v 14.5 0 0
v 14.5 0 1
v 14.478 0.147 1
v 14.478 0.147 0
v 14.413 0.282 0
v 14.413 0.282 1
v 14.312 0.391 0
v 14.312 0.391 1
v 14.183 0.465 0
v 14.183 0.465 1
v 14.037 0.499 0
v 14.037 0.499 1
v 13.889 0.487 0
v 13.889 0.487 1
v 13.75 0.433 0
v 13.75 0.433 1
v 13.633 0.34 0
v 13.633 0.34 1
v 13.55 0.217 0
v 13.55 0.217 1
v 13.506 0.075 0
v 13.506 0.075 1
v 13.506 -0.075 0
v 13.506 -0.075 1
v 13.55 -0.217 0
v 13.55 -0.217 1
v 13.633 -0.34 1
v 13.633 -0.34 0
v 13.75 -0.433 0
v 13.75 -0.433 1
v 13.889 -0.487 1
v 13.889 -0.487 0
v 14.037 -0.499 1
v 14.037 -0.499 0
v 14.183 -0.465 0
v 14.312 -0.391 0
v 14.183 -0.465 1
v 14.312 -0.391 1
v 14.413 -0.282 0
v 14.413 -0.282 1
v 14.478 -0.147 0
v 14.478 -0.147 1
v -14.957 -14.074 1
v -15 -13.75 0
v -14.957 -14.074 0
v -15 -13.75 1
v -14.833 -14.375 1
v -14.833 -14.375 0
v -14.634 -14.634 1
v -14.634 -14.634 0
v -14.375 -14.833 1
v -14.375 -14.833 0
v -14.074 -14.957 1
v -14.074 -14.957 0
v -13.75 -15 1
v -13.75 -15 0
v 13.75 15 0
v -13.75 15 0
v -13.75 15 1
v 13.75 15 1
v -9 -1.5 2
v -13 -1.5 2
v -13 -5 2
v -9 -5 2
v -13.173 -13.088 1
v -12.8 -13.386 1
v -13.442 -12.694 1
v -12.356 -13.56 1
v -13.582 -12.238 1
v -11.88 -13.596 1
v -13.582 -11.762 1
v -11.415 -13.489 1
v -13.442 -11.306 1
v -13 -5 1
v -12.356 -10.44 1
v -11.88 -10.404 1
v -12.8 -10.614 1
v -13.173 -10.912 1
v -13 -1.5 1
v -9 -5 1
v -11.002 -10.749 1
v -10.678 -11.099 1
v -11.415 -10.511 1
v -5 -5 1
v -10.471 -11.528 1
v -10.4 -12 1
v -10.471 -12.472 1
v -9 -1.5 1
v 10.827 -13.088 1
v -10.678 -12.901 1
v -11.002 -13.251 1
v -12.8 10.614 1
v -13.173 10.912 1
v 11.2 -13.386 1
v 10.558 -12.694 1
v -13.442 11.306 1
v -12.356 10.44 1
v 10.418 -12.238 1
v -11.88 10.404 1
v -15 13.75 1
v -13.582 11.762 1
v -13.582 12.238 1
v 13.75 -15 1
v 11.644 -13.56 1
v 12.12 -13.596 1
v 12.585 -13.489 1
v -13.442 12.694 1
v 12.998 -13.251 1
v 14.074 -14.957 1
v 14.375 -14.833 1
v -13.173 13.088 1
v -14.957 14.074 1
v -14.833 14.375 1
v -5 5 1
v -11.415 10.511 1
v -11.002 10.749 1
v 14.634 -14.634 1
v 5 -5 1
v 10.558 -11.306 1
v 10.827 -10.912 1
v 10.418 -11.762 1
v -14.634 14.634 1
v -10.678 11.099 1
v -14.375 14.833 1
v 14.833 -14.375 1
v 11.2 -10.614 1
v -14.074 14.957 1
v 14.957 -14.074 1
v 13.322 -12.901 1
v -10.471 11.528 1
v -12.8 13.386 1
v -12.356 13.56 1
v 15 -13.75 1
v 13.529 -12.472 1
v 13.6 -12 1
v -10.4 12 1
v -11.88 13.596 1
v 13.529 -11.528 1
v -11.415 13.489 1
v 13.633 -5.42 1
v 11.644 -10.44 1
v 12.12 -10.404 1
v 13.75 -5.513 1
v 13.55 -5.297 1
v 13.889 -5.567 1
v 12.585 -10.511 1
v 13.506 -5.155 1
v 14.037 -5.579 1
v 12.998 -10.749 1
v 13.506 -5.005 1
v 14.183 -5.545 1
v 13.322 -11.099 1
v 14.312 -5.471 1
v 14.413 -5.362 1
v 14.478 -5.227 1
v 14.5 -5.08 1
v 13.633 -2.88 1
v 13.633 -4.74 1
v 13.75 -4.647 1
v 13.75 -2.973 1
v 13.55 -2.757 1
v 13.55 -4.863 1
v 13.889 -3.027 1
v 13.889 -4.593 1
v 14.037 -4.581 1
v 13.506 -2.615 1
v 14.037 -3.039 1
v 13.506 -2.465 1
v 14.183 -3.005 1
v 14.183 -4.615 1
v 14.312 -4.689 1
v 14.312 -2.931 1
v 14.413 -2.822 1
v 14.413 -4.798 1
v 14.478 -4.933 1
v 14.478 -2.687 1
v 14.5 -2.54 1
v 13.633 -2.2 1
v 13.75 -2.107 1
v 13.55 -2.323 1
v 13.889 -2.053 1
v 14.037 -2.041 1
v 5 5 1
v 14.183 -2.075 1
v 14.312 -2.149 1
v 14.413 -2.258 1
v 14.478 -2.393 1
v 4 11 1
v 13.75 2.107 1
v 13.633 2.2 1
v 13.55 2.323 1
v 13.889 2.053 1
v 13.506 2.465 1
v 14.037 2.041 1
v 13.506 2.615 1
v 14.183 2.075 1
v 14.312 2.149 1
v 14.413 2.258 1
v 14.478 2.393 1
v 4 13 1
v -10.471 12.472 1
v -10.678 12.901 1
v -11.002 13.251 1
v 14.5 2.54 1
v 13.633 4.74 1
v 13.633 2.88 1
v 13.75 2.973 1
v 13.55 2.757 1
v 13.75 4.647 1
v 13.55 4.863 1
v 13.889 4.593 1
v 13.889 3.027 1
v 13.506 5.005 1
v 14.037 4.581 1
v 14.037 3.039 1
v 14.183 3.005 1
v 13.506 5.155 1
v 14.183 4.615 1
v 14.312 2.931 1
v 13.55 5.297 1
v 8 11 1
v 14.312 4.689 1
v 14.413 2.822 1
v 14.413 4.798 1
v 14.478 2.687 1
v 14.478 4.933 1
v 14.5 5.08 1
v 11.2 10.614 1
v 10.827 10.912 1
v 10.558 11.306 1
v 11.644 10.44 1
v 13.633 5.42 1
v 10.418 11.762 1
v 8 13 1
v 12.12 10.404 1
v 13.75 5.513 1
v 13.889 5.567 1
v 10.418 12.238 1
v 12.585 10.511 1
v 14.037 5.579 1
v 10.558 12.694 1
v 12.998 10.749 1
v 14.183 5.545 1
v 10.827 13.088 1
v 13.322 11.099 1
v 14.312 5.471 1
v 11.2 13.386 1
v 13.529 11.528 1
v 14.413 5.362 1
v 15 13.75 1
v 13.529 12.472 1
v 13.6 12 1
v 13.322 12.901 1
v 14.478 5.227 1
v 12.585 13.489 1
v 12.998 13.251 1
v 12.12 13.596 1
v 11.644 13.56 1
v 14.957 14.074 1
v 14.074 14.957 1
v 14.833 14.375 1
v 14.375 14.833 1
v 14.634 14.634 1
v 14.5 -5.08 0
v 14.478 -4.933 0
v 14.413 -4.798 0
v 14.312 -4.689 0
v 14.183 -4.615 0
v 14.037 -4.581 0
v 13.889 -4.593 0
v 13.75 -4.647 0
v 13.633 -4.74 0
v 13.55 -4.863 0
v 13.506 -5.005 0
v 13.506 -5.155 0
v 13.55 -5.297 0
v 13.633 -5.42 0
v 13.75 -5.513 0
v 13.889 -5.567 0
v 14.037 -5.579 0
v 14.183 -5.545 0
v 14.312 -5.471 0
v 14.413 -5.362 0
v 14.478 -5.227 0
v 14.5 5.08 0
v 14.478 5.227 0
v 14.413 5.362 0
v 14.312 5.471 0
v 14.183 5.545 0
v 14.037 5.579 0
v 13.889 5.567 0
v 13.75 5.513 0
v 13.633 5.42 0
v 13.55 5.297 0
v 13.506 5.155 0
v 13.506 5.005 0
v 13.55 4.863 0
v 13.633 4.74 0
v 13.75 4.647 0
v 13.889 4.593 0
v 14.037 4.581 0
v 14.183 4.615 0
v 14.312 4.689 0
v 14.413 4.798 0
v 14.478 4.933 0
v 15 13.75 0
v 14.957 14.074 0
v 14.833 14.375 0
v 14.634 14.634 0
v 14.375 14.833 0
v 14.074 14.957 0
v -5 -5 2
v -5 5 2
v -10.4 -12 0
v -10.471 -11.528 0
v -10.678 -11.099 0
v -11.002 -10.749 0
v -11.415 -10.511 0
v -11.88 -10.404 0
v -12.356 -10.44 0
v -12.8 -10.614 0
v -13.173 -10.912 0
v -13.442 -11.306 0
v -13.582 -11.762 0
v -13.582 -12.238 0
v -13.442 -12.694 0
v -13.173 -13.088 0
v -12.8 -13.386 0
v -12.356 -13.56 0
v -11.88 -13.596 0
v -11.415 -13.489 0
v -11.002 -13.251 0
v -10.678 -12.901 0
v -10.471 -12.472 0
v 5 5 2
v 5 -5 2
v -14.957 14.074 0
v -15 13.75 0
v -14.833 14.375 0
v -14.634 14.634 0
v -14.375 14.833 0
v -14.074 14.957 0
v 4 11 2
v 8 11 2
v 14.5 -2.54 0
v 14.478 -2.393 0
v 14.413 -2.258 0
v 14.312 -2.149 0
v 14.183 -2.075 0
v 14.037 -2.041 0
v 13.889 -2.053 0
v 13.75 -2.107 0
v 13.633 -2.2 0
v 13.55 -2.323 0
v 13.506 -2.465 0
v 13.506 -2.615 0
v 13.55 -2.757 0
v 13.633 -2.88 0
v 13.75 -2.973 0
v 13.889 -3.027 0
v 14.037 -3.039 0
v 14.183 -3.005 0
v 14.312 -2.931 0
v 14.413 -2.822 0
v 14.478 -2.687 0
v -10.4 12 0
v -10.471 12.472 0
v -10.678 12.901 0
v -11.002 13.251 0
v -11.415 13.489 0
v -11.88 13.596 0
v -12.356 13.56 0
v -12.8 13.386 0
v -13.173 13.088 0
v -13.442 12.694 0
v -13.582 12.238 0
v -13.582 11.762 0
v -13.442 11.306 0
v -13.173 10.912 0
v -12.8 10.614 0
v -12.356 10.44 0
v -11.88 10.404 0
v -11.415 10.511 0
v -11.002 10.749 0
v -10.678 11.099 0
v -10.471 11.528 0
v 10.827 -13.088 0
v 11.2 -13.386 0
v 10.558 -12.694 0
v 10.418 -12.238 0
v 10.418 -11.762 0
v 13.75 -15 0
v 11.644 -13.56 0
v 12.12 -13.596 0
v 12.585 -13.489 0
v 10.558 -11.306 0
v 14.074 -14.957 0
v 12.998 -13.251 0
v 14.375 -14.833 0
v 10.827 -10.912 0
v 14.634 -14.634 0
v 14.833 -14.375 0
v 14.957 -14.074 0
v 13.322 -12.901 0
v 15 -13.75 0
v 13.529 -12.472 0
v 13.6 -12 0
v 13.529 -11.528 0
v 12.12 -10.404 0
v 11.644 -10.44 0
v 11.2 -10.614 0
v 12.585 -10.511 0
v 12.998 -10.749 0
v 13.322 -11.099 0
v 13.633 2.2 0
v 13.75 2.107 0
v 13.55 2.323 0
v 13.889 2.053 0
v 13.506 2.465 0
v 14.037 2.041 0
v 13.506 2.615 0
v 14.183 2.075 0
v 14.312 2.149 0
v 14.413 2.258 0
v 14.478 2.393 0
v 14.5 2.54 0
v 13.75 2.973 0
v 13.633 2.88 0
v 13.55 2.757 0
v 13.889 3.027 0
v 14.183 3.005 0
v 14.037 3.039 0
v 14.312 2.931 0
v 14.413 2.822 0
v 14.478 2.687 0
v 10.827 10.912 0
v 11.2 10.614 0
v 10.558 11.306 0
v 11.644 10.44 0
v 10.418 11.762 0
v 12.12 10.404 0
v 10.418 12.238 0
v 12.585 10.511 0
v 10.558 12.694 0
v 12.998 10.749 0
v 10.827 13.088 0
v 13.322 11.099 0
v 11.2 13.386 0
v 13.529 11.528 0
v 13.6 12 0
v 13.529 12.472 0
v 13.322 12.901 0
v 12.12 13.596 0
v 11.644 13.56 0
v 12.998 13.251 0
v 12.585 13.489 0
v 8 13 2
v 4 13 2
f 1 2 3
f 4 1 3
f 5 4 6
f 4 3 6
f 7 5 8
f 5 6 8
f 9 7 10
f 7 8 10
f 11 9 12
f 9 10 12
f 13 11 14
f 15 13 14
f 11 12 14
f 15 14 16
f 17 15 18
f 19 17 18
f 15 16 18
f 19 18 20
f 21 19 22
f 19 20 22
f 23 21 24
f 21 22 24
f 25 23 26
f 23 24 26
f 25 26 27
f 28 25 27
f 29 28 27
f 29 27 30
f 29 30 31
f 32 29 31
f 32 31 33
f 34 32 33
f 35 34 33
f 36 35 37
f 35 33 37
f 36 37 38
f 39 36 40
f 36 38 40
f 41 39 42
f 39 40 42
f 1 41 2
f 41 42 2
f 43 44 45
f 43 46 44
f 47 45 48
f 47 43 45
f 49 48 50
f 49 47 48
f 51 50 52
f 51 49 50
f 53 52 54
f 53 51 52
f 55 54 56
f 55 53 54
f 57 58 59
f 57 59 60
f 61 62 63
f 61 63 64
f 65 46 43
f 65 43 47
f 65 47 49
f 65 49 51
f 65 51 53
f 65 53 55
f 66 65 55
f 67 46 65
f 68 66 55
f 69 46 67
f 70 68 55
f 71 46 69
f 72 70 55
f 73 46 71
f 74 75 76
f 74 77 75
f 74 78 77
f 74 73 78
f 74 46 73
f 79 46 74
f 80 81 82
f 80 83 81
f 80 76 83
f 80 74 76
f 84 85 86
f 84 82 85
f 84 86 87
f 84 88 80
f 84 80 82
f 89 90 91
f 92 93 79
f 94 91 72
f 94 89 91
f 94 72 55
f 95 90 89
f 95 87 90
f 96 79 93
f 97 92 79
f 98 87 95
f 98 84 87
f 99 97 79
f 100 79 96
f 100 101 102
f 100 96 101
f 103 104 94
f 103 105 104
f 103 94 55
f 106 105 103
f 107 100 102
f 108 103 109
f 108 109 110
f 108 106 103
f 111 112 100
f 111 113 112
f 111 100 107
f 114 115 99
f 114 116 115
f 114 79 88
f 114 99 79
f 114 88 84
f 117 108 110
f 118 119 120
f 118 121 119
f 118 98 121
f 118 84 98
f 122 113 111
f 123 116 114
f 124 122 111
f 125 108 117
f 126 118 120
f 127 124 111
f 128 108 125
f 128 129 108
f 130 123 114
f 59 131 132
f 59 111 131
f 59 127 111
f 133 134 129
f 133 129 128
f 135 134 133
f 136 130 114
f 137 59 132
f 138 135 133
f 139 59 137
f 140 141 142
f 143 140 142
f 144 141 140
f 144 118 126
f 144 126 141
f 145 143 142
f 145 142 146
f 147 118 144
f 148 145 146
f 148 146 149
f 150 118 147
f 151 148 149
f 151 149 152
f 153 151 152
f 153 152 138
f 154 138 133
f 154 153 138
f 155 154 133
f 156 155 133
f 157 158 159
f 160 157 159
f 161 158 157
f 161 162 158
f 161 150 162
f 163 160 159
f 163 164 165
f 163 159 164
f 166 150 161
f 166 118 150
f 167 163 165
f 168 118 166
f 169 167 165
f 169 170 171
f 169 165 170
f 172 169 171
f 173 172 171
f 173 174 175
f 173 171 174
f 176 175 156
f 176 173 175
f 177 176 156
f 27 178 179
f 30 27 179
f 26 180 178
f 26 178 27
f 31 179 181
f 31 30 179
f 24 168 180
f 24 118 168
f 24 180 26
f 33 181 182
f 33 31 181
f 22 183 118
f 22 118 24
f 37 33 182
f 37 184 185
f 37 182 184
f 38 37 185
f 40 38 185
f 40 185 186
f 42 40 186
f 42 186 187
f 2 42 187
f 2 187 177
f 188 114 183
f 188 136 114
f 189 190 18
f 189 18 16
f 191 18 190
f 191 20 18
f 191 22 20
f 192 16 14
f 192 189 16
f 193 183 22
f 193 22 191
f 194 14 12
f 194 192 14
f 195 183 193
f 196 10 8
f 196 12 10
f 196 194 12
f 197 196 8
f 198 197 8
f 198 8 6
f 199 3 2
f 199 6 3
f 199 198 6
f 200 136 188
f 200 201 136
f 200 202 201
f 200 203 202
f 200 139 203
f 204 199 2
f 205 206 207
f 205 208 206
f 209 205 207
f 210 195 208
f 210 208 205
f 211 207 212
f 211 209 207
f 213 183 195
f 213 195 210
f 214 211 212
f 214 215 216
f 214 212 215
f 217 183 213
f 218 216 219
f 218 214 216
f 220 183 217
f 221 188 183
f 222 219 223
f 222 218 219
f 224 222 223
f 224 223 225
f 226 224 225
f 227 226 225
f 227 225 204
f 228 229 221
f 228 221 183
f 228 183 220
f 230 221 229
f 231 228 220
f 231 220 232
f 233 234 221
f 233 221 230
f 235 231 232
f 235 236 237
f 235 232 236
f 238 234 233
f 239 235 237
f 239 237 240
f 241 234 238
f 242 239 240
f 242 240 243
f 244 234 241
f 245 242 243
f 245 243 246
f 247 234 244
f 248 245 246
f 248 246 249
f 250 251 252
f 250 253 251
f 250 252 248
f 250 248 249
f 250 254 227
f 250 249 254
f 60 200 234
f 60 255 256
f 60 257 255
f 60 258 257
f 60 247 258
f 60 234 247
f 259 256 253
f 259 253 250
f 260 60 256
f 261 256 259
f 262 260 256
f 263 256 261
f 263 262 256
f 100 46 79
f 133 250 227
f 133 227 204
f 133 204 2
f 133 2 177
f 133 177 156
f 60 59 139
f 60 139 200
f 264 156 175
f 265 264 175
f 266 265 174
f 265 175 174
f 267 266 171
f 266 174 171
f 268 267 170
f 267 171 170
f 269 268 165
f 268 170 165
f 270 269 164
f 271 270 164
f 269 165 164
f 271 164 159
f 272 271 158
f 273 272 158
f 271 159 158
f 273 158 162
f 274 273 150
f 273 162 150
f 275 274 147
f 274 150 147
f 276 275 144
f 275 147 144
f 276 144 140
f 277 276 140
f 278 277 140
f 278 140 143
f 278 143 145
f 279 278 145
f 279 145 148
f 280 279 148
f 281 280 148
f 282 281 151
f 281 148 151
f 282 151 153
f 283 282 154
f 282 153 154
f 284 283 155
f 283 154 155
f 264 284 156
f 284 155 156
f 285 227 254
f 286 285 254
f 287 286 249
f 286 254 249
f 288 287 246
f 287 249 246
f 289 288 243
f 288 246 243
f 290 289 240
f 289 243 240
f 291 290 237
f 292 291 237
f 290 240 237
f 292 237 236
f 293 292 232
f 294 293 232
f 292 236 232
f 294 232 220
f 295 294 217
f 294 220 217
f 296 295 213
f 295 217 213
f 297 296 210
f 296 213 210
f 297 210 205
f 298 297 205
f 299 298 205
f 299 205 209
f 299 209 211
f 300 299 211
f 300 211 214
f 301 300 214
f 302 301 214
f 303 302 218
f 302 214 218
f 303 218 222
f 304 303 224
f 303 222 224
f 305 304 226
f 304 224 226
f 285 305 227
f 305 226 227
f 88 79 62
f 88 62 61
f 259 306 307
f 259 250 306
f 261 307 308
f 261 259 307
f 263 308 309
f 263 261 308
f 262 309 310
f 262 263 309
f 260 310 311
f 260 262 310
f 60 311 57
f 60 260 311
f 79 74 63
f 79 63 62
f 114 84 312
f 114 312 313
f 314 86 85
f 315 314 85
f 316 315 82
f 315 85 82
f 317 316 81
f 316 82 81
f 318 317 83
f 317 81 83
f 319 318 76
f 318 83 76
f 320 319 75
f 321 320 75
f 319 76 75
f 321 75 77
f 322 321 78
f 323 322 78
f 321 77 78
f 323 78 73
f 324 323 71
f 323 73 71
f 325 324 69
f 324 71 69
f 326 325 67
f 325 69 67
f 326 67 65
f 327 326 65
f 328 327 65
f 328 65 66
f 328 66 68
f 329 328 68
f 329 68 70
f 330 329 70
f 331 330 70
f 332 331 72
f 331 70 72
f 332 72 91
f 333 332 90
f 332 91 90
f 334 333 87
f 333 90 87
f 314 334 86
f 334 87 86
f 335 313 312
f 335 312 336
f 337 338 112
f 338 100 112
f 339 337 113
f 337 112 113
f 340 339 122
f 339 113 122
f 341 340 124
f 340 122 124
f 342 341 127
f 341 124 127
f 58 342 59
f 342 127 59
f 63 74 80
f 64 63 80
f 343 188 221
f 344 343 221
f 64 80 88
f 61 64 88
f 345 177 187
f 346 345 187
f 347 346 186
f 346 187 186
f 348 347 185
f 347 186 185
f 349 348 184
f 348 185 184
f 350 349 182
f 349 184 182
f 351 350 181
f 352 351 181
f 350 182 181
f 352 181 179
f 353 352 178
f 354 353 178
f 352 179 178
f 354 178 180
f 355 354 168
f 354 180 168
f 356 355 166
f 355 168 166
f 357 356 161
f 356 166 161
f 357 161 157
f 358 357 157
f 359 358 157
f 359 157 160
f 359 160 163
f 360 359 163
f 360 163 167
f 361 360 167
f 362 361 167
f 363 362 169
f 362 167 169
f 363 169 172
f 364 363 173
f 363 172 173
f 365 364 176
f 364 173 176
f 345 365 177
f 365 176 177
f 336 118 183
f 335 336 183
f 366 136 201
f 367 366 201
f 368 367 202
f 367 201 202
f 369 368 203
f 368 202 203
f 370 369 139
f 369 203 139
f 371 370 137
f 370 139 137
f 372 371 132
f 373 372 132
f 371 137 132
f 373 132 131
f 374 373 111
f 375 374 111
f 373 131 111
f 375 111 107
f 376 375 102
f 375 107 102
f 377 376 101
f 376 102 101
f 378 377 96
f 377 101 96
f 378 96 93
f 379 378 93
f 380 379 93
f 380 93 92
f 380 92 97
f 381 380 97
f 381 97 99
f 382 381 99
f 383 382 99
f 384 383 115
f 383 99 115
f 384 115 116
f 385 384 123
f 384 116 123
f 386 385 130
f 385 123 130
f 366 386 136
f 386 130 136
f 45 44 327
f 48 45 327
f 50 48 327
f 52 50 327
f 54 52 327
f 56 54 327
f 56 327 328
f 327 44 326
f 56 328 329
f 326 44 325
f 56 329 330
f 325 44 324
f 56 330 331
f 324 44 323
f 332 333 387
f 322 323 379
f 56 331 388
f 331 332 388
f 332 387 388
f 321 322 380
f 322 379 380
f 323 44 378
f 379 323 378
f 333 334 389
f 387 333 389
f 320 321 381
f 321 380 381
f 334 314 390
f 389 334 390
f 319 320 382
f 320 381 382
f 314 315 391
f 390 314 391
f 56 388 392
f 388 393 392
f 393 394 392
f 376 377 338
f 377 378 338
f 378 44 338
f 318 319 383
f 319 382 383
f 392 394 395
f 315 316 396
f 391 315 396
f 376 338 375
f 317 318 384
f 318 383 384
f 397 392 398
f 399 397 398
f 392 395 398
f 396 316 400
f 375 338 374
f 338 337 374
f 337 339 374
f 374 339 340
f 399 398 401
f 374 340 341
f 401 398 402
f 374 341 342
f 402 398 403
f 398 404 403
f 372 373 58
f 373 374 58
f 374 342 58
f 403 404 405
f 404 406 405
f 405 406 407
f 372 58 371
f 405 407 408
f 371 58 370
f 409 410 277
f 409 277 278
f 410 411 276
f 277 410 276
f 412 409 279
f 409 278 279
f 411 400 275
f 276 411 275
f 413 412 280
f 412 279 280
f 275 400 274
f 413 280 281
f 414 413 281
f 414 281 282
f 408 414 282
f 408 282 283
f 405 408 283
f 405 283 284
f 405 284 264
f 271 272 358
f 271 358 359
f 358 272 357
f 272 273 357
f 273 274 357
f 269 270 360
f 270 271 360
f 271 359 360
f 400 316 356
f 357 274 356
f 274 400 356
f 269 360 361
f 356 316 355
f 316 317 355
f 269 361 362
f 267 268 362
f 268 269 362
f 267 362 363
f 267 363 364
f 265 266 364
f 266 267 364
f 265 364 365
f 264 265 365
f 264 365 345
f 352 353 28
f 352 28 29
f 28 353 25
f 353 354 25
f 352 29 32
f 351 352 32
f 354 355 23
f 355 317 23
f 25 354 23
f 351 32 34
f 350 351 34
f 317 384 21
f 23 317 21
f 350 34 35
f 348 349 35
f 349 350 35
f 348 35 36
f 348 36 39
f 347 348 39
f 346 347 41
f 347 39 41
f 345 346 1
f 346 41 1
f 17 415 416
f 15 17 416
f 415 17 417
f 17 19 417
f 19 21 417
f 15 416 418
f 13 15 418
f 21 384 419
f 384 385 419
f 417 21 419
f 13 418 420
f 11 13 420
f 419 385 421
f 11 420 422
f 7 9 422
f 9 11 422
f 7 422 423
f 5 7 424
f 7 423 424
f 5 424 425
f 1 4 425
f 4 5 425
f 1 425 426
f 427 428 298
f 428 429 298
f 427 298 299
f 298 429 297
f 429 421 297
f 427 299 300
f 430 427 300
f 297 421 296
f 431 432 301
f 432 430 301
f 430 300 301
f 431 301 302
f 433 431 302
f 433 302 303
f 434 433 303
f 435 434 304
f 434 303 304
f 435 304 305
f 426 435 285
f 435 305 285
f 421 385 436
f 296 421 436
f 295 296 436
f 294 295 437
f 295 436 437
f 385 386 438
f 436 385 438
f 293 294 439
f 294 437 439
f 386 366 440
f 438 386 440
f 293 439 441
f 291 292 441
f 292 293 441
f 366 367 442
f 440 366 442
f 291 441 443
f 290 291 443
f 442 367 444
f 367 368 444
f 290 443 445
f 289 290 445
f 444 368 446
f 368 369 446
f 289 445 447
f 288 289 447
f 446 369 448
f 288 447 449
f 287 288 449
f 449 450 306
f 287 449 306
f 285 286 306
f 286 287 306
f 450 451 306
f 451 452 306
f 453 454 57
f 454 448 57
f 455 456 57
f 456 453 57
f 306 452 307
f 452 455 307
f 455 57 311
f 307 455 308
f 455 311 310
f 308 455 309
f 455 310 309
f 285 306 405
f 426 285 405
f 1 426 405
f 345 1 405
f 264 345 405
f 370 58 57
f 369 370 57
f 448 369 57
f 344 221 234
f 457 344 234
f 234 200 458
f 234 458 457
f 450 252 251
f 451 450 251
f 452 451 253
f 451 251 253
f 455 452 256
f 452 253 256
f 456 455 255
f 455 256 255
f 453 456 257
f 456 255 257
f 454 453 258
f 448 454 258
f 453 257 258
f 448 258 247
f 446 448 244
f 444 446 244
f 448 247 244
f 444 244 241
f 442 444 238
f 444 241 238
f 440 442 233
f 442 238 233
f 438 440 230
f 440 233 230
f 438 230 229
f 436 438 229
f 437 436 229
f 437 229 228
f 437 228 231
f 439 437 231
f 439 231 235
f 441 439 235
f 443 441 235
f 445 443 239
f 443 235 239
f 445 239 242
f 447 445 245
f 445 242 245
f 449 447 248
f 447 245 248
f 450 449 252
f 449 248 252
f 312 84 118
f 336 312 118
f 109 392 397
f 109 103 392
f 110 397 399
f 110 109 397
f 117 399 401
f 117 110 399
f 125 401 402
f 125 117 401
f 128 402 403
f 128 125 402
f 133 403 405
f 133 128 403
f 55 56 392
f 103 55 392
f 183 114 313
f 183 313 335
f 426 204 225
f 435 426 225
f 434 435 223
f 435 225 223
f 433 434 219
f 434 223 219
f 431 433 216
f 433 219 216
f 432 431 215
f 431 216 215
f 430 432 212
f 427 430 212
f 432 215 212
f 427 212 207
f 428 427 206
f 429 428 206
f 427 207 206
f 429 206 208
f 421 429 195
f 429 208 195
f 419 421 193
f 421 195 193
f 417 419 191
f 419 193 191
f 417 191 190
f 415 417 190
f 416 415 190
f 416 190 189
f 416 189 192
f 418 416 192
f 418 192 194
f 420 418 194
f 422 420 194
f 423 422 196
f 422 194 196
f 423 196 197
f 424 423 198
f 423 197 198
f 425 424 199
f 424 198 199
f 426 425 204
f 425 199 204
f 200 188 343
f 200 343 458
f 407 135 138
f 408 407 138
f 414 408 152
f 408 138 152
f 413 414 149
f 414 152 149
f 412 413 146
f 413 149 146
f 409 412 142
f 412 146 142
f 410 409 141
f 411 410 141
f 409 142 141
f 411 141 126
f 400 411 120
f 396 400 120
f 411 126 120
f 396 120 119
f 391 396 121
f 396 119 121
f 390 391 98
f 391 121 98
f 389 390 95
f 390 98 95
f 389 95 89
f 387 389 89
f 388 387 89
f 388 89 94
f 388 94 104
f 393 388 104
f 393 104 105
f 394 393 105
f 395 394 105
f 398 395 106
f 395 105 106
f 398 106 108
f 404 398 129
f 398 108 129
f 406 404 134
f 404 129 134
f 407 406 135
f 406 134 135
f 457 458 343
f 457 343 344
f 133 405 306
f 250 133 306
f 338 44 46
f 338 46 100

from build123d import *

# Parameters (mm, degrees)
SKETCH_1_W                 = 30
SKETCH_1_H                 = 30
EXTRUDE_1_DEPTH            = 1
FILLET_1_R                 = 1.25
SKETCH_2_R                 = 1.6
CUT_EXTRUDE_1_DEPTH        = 1
SKETCH_3_R                 = 0.5
CUT_EXTRUDE_2_DEPTH        = 1
PATTERN_LINEAR_1_COUNT     = 3
PATTERN_LINEAR_1_PITCH     = 2.54
PATTERN_LINEAR_1_COL_COUNT = 3
PATTERN_LINEAR_1_COL_PITCH = 2.54
SKETCH_4_W                 = 10
SKETCH_4_H                 = 10
EXTRUDE_2_DEPTH            = 1
SKETCH_5_W                 = 4
SKETCH_5_H                 = 3.5
SKETCH_5_H_2               = 2
EXTRUDE_3_DEPTH            = 1


with BuildPart() as part:
    # ｽｹｯﾁ1 → ﾎﾞｽ - 押し出し1 (new body)
    with BuildSketch(Plane.XY):
        Rectangle(SKETCH_1_W, SKETCH_1_H)
    extrude(amount=EXTRUDE_1_DEPTH)

    # ﾌｨﾚｯﾄ1
    fillet_1_edges = [part.edges().sort_by_distance(p)[0] for p in [
        (15, -15, 0.5),
        (-15, -15, 0.5),
        (-15, 15, 0.5),
        (15, 15, 0.5),
    ]]
    fillet(fillet_1_edges, radius=FILLET_1_R)

    # ｽｹｯﾁ2 → ｶｯﾄ - 押し出し1 (cut)
    with BuildSketch(Plane.XY.offset(1)):
        with Locations((-12, 12)):
            Circle(SKETCH_2_R)
        with Locations((12, 12)):
            Circle(SKETCH_2_R)
        with Locations((-12, -12)):
            Circle(SKETCH_2_R)
        with Locations((12, -12)):
            Circle(SKETCH_2_R)
    extrude(amount=-CUT_EXTRUDE_1_DEPTH, mode=Mode.SUBTRACT)

    # ｽｹｯﾁ3 → ｶｯﾄ - 押し出し2 (cut)
    with BuildSketch(Plane.XY.offset(1)):
        with Locations((14, 0)):
            Circle(SKETCH_3_R)
    cut_extrude_2 = extrude(amount=-CUT_EXTRUDE_2_DEPTH, mode=Mode.SUBTRACT)

    # 直線ﾊﾟﾀｰﾝ1: ｶｯﾄ - 押し出し2 ×3
    with Locations(*[(0, -i * PATTERN_LINEAR_1_PITCH, 0) for i in range(1, PATTERN_LINEAR_1_COUNT)]):
        add(cut_extrude_2, mode=Mode.SUBTRACT)

    # 直線ﾊﾟﾀｰﾝ1 col: ｶｯﾄ - 押し出し2 ×3
    with Locations(*[(0, i * PATTERN_LINEAR_1_COL_PITCH, 0) for i in range(1, PATTERN_LINEAR_1_COL_COUNT)]):
        add(cut_extrude_2, mode=Mode.SUBTRACT)

    # ｽｹｯﾁ4 → ﾎﾞｽ - 押し出し2 (add)
    with BuildSketch(Plane.XY.offset(1)):
        Rectangle(SKETCH_4_W, SKETCH_4_H)
    extrude(amount=EXTRUDE_2_DEPTH)

    # ｽｹｯﾁ5 → ﾎﾞｽ - 押し出し3 (add)
    with BuildSketch(Plane.XY.offset(1)):
        with Locations((-11, -3.25)):
            Rectangle(SKETCH_5_W, SKETCH_5_H)
        with Locations((6, 12)):
            Rectangle(SKETCH_5_W, SKETCH_5_H_2)
    extrude(amount=EXTRUDE_3_DEPTH)


solid = part.part
